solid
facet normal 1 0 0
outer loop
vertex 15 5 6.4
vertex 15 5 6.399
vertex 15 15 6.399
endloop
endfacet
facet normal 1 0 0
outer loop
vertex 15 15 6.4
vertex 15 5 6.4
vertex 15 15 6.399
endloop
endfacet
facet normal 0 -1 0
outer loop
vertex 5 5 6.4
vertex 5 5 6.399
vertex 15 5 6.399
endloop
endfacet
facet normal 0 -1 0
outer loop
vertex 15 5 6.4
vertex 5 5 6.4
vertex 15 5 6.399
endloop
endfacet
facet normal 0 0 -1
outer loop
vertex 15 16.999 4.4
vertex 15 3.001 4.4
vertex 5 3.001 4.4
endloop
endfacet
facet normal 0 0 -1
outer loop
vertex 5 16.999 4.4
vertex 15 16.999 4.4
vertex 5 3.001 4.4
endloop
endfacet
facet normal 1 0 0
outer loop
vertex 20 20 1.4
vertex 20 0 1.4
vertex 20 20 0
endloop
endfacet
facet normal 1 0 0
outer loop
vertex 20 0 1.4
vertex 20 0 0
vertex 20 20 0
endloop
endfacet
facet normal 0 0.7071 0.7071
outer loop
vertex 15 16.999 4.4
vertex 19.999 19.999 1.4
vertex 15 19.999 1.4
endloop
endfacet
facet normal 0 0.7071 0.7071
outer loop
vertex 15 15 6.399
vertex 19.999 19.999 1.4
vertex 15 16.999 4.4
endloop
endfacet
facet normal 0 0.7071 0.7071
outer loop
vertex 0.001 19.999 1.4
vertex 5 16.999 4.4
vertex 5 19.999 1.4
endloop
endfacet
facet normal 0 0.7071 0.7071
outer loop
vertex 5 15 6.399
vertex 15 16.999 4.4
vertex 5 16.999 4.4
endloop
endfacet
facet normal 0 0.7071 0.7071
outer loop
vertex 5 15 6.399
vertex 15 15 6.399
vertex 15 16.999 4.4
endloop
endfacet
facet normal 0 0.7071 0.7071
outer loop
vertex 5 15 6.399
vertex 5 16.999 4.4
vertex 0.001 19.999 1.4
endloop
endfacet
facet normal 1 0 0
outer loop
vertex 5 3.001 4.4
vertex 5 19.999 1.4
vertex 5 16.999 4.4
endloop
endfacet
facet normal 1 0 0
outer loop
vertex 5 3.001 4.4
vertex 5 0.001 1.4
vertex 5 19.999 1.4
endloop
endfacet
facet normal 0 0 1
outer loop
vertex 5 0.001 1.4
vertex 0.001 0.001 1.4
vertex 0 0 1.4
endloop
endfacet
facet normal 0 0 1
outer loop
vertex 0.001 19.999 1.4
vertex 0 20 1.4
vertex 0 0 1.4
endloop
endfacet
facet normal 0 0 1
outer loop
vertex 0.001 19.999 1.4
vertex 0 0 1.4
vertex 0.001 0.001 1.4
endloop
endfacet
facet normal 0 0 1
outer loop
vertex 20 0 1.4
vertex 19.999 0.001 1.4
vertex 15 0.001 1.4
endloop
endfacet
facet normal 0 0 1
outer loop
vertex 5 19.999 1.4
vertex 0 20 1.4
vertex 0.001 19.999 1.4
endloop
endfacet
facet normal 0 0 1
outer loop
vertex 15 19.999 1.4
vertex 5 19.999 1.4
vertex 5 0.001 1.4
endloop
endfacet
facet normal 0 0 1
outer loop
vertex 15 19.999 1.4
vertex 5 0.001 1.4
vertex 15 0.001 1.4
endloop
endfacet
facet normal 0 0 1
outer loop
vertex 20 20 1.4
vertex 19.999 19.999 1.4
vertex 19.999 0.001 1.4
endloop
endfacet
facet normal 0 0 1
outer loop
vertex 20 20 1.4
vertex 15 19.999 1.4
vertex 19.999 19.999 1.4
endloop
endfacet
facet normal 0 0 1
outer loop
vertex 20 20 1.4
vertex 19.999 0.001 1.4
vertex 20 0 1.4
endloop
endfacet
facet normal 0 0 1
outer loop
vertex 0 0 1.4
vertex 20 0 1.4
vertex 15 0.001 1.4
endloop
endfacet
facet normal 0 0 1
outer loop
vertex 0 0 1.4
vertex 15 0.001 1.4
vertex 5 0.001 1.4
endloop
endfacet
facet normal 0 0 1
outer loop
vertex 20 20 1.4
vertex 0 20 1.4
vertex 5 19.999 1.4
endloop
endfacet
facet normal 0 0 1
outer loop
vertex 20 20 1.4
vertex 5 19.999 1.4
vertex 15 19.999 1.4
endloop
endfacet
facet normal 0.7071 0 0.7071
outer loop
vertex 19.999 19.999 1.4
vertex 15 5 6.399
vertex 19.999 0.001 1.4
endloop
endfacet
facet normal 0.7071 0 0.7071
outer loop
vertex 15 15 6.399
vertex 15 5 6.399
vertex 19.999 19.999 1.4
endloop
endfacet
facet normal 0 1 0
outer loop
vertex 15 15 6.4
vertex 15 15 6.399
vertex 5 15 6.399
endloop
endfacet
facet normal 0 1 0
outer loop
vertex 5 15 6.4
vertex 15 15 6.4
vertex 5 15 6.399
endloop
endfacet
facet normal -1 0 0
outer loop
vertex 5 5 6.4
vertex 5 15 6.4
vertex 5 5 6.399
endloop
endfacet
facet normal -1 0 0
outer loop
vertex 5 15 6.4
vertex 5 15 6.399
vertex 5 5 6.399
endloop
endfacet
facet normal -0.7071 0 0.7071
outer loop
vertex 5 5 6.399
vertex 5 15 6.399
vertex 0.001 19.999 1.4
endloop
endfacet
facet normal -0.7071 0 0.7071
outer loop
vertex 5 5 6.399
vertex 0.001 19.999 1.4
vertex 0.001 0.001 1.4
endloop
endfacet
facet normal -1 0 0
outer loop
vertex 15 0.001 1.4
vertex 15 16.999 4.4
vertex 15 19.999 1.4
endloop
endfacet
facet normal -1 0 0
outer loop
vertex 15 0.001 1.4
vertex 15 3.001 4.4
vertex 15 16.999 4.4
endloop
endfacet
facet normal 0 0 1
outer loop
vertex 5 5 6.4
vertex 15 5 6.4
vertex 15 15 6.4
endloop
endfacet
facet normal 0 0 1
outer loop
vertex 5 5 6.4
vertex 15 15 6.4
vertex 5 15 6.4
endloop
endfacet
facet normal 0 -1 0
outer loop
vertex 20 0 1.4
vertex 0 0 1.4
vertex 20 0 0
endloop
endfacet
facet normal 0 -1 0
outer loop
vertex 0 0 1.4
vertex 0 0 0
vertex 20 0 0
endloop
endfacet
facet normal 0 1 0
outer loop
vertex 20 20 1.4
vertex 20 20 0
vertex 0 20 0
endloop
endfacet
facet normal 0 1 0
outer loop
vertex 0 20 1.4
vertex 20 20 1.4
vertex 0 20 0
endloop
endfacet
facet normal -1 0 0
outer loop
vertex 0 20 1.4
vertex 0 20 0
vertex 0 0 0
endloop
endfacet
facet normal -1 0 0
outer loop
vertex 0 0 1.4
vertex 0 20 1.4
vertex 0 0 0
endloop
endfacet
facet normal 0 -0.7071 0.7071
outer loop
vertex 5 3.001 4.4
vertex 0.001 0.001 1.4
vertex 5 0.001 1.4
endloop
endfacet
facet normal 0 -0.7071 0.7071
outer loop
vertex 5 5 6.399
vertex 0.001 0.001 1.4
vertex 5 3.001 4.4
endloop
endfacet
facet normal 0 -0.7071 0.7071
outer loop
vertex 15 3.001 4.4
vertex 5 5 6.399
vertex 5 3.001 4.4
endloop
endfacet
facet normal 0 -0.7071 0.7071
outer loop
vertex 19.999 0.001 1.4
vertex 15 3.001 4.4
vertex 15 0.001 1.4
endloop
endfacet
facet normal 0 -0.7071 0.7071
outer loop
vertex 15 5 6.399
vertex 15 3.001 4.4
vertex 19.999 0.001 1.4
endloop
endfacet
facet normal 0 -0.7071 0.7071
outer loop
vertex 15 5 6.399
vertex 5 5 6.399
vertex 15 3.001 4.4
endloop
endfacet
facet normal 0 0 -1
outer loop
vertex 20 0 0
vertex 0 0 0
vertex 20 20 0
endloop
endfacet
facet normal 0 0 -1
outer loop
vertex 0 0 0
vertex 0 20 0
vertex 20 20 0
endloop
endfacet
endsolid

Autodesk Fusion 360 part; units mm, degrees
sketch "Skizze1" plane through (0, 0, 0) normal (0, 0, 1) x (1, 0, 0)
  line L0 (0, 0) -> (20, 0)
  line L1 (20, 0) -> (20, 20)
  line L2 (20, 20) -> (0, 20)
  line L3 (0, 20) -> (0, 0)
  dimension "d1" = 20
  dimension "d2" = 20
extrude "Extrusion1" add sketch "Skizze1" along normal blind 1.4
sketch "Skizze2" plane through (0, 0, 1.4) normal (0, 0, 1) x (-1, 0, 0)
  line L0 (0, -20) -> (0, 0)
  line L1 (0, 0) -> (-20, 0)
  line L2 (-20, 0) -> (-20, -20)
  line L3 (-20, -20) -> (0, -20)
  line L4 (-15, -15) -> (-5, -15)
  line L5 (-5, -15) -> (-5, -5)
  line L6 (-5, -5) -> (-15, -5)
  line L7 (-15, -5) -> (-15, -15)
  line L8 (-15, -15) -> (-5, -5) construction
  line L9 (-5, -15) -> (-15, -5) construction
  point P0 (-10, -10)
extrude "Extrusion2" add sketch "Skizze2" along normal blind 5 contours L4 L5 L6 L7
chamfer "Fase1" distance 5 angle 45 4 edges at (10, 5, 1.4) (5, 10, 1.4) (10, 15, 1.4) (15, 10, 1.4)
sketch "Skizze3" plane through (0, 0, 0) normal (0, 1, 0) x (1, 0, 0)
  line L0 (0, 0) -> (0, -1.4)
  line L1 (0, -1.4) -> (20, -1.4)
  line L2 (10, -1.4) -> (10, -4.4)
  line L3 (10, -4.4) -> (7, -4.4)
  line L4 (7, -4.4) -> (13, -4.4)
  line L5 (13, -4.4) -> (13, -1.4)
  line L6 (13, -1.4) -> (7, -1.4)
  line L7 (7, -1.4) -> (7, -4.4)
  line L8 (7, -4.4) -> (5, -4.4)
  line L9 (5, -4.4) -> (15, -4.4)
  line L10 (15, -4.4) -> (15, -1.4)
  line L11 (15, -1.4) -> (5, -1.4)
  line L12 (5, -1.4) -> (5, -4.4)
  dimension "d8" = 2
extrude "Extrusion3" cut sketch "Skizze3" along normal blind 21
sketch "Skizze4" plane through (0, 0, 0) normal (1, 0, 0) x (0, 1, 0)
  line L0 (0, 0) -> (0, 1.4)
  line L1 (0, 1.4) -> (5, 1.4)
  line L2 (5, 1.4) -> (15, 1.4)
  line L3 (15, 1.4) -> (15, 4.4)
  line L4 (15, 4.4) -> (5, 4.4)
  line L5 (5, 4.4) -> (5, 1.4)
  dimension "d11" = 10
  dimension "d12" = 3
